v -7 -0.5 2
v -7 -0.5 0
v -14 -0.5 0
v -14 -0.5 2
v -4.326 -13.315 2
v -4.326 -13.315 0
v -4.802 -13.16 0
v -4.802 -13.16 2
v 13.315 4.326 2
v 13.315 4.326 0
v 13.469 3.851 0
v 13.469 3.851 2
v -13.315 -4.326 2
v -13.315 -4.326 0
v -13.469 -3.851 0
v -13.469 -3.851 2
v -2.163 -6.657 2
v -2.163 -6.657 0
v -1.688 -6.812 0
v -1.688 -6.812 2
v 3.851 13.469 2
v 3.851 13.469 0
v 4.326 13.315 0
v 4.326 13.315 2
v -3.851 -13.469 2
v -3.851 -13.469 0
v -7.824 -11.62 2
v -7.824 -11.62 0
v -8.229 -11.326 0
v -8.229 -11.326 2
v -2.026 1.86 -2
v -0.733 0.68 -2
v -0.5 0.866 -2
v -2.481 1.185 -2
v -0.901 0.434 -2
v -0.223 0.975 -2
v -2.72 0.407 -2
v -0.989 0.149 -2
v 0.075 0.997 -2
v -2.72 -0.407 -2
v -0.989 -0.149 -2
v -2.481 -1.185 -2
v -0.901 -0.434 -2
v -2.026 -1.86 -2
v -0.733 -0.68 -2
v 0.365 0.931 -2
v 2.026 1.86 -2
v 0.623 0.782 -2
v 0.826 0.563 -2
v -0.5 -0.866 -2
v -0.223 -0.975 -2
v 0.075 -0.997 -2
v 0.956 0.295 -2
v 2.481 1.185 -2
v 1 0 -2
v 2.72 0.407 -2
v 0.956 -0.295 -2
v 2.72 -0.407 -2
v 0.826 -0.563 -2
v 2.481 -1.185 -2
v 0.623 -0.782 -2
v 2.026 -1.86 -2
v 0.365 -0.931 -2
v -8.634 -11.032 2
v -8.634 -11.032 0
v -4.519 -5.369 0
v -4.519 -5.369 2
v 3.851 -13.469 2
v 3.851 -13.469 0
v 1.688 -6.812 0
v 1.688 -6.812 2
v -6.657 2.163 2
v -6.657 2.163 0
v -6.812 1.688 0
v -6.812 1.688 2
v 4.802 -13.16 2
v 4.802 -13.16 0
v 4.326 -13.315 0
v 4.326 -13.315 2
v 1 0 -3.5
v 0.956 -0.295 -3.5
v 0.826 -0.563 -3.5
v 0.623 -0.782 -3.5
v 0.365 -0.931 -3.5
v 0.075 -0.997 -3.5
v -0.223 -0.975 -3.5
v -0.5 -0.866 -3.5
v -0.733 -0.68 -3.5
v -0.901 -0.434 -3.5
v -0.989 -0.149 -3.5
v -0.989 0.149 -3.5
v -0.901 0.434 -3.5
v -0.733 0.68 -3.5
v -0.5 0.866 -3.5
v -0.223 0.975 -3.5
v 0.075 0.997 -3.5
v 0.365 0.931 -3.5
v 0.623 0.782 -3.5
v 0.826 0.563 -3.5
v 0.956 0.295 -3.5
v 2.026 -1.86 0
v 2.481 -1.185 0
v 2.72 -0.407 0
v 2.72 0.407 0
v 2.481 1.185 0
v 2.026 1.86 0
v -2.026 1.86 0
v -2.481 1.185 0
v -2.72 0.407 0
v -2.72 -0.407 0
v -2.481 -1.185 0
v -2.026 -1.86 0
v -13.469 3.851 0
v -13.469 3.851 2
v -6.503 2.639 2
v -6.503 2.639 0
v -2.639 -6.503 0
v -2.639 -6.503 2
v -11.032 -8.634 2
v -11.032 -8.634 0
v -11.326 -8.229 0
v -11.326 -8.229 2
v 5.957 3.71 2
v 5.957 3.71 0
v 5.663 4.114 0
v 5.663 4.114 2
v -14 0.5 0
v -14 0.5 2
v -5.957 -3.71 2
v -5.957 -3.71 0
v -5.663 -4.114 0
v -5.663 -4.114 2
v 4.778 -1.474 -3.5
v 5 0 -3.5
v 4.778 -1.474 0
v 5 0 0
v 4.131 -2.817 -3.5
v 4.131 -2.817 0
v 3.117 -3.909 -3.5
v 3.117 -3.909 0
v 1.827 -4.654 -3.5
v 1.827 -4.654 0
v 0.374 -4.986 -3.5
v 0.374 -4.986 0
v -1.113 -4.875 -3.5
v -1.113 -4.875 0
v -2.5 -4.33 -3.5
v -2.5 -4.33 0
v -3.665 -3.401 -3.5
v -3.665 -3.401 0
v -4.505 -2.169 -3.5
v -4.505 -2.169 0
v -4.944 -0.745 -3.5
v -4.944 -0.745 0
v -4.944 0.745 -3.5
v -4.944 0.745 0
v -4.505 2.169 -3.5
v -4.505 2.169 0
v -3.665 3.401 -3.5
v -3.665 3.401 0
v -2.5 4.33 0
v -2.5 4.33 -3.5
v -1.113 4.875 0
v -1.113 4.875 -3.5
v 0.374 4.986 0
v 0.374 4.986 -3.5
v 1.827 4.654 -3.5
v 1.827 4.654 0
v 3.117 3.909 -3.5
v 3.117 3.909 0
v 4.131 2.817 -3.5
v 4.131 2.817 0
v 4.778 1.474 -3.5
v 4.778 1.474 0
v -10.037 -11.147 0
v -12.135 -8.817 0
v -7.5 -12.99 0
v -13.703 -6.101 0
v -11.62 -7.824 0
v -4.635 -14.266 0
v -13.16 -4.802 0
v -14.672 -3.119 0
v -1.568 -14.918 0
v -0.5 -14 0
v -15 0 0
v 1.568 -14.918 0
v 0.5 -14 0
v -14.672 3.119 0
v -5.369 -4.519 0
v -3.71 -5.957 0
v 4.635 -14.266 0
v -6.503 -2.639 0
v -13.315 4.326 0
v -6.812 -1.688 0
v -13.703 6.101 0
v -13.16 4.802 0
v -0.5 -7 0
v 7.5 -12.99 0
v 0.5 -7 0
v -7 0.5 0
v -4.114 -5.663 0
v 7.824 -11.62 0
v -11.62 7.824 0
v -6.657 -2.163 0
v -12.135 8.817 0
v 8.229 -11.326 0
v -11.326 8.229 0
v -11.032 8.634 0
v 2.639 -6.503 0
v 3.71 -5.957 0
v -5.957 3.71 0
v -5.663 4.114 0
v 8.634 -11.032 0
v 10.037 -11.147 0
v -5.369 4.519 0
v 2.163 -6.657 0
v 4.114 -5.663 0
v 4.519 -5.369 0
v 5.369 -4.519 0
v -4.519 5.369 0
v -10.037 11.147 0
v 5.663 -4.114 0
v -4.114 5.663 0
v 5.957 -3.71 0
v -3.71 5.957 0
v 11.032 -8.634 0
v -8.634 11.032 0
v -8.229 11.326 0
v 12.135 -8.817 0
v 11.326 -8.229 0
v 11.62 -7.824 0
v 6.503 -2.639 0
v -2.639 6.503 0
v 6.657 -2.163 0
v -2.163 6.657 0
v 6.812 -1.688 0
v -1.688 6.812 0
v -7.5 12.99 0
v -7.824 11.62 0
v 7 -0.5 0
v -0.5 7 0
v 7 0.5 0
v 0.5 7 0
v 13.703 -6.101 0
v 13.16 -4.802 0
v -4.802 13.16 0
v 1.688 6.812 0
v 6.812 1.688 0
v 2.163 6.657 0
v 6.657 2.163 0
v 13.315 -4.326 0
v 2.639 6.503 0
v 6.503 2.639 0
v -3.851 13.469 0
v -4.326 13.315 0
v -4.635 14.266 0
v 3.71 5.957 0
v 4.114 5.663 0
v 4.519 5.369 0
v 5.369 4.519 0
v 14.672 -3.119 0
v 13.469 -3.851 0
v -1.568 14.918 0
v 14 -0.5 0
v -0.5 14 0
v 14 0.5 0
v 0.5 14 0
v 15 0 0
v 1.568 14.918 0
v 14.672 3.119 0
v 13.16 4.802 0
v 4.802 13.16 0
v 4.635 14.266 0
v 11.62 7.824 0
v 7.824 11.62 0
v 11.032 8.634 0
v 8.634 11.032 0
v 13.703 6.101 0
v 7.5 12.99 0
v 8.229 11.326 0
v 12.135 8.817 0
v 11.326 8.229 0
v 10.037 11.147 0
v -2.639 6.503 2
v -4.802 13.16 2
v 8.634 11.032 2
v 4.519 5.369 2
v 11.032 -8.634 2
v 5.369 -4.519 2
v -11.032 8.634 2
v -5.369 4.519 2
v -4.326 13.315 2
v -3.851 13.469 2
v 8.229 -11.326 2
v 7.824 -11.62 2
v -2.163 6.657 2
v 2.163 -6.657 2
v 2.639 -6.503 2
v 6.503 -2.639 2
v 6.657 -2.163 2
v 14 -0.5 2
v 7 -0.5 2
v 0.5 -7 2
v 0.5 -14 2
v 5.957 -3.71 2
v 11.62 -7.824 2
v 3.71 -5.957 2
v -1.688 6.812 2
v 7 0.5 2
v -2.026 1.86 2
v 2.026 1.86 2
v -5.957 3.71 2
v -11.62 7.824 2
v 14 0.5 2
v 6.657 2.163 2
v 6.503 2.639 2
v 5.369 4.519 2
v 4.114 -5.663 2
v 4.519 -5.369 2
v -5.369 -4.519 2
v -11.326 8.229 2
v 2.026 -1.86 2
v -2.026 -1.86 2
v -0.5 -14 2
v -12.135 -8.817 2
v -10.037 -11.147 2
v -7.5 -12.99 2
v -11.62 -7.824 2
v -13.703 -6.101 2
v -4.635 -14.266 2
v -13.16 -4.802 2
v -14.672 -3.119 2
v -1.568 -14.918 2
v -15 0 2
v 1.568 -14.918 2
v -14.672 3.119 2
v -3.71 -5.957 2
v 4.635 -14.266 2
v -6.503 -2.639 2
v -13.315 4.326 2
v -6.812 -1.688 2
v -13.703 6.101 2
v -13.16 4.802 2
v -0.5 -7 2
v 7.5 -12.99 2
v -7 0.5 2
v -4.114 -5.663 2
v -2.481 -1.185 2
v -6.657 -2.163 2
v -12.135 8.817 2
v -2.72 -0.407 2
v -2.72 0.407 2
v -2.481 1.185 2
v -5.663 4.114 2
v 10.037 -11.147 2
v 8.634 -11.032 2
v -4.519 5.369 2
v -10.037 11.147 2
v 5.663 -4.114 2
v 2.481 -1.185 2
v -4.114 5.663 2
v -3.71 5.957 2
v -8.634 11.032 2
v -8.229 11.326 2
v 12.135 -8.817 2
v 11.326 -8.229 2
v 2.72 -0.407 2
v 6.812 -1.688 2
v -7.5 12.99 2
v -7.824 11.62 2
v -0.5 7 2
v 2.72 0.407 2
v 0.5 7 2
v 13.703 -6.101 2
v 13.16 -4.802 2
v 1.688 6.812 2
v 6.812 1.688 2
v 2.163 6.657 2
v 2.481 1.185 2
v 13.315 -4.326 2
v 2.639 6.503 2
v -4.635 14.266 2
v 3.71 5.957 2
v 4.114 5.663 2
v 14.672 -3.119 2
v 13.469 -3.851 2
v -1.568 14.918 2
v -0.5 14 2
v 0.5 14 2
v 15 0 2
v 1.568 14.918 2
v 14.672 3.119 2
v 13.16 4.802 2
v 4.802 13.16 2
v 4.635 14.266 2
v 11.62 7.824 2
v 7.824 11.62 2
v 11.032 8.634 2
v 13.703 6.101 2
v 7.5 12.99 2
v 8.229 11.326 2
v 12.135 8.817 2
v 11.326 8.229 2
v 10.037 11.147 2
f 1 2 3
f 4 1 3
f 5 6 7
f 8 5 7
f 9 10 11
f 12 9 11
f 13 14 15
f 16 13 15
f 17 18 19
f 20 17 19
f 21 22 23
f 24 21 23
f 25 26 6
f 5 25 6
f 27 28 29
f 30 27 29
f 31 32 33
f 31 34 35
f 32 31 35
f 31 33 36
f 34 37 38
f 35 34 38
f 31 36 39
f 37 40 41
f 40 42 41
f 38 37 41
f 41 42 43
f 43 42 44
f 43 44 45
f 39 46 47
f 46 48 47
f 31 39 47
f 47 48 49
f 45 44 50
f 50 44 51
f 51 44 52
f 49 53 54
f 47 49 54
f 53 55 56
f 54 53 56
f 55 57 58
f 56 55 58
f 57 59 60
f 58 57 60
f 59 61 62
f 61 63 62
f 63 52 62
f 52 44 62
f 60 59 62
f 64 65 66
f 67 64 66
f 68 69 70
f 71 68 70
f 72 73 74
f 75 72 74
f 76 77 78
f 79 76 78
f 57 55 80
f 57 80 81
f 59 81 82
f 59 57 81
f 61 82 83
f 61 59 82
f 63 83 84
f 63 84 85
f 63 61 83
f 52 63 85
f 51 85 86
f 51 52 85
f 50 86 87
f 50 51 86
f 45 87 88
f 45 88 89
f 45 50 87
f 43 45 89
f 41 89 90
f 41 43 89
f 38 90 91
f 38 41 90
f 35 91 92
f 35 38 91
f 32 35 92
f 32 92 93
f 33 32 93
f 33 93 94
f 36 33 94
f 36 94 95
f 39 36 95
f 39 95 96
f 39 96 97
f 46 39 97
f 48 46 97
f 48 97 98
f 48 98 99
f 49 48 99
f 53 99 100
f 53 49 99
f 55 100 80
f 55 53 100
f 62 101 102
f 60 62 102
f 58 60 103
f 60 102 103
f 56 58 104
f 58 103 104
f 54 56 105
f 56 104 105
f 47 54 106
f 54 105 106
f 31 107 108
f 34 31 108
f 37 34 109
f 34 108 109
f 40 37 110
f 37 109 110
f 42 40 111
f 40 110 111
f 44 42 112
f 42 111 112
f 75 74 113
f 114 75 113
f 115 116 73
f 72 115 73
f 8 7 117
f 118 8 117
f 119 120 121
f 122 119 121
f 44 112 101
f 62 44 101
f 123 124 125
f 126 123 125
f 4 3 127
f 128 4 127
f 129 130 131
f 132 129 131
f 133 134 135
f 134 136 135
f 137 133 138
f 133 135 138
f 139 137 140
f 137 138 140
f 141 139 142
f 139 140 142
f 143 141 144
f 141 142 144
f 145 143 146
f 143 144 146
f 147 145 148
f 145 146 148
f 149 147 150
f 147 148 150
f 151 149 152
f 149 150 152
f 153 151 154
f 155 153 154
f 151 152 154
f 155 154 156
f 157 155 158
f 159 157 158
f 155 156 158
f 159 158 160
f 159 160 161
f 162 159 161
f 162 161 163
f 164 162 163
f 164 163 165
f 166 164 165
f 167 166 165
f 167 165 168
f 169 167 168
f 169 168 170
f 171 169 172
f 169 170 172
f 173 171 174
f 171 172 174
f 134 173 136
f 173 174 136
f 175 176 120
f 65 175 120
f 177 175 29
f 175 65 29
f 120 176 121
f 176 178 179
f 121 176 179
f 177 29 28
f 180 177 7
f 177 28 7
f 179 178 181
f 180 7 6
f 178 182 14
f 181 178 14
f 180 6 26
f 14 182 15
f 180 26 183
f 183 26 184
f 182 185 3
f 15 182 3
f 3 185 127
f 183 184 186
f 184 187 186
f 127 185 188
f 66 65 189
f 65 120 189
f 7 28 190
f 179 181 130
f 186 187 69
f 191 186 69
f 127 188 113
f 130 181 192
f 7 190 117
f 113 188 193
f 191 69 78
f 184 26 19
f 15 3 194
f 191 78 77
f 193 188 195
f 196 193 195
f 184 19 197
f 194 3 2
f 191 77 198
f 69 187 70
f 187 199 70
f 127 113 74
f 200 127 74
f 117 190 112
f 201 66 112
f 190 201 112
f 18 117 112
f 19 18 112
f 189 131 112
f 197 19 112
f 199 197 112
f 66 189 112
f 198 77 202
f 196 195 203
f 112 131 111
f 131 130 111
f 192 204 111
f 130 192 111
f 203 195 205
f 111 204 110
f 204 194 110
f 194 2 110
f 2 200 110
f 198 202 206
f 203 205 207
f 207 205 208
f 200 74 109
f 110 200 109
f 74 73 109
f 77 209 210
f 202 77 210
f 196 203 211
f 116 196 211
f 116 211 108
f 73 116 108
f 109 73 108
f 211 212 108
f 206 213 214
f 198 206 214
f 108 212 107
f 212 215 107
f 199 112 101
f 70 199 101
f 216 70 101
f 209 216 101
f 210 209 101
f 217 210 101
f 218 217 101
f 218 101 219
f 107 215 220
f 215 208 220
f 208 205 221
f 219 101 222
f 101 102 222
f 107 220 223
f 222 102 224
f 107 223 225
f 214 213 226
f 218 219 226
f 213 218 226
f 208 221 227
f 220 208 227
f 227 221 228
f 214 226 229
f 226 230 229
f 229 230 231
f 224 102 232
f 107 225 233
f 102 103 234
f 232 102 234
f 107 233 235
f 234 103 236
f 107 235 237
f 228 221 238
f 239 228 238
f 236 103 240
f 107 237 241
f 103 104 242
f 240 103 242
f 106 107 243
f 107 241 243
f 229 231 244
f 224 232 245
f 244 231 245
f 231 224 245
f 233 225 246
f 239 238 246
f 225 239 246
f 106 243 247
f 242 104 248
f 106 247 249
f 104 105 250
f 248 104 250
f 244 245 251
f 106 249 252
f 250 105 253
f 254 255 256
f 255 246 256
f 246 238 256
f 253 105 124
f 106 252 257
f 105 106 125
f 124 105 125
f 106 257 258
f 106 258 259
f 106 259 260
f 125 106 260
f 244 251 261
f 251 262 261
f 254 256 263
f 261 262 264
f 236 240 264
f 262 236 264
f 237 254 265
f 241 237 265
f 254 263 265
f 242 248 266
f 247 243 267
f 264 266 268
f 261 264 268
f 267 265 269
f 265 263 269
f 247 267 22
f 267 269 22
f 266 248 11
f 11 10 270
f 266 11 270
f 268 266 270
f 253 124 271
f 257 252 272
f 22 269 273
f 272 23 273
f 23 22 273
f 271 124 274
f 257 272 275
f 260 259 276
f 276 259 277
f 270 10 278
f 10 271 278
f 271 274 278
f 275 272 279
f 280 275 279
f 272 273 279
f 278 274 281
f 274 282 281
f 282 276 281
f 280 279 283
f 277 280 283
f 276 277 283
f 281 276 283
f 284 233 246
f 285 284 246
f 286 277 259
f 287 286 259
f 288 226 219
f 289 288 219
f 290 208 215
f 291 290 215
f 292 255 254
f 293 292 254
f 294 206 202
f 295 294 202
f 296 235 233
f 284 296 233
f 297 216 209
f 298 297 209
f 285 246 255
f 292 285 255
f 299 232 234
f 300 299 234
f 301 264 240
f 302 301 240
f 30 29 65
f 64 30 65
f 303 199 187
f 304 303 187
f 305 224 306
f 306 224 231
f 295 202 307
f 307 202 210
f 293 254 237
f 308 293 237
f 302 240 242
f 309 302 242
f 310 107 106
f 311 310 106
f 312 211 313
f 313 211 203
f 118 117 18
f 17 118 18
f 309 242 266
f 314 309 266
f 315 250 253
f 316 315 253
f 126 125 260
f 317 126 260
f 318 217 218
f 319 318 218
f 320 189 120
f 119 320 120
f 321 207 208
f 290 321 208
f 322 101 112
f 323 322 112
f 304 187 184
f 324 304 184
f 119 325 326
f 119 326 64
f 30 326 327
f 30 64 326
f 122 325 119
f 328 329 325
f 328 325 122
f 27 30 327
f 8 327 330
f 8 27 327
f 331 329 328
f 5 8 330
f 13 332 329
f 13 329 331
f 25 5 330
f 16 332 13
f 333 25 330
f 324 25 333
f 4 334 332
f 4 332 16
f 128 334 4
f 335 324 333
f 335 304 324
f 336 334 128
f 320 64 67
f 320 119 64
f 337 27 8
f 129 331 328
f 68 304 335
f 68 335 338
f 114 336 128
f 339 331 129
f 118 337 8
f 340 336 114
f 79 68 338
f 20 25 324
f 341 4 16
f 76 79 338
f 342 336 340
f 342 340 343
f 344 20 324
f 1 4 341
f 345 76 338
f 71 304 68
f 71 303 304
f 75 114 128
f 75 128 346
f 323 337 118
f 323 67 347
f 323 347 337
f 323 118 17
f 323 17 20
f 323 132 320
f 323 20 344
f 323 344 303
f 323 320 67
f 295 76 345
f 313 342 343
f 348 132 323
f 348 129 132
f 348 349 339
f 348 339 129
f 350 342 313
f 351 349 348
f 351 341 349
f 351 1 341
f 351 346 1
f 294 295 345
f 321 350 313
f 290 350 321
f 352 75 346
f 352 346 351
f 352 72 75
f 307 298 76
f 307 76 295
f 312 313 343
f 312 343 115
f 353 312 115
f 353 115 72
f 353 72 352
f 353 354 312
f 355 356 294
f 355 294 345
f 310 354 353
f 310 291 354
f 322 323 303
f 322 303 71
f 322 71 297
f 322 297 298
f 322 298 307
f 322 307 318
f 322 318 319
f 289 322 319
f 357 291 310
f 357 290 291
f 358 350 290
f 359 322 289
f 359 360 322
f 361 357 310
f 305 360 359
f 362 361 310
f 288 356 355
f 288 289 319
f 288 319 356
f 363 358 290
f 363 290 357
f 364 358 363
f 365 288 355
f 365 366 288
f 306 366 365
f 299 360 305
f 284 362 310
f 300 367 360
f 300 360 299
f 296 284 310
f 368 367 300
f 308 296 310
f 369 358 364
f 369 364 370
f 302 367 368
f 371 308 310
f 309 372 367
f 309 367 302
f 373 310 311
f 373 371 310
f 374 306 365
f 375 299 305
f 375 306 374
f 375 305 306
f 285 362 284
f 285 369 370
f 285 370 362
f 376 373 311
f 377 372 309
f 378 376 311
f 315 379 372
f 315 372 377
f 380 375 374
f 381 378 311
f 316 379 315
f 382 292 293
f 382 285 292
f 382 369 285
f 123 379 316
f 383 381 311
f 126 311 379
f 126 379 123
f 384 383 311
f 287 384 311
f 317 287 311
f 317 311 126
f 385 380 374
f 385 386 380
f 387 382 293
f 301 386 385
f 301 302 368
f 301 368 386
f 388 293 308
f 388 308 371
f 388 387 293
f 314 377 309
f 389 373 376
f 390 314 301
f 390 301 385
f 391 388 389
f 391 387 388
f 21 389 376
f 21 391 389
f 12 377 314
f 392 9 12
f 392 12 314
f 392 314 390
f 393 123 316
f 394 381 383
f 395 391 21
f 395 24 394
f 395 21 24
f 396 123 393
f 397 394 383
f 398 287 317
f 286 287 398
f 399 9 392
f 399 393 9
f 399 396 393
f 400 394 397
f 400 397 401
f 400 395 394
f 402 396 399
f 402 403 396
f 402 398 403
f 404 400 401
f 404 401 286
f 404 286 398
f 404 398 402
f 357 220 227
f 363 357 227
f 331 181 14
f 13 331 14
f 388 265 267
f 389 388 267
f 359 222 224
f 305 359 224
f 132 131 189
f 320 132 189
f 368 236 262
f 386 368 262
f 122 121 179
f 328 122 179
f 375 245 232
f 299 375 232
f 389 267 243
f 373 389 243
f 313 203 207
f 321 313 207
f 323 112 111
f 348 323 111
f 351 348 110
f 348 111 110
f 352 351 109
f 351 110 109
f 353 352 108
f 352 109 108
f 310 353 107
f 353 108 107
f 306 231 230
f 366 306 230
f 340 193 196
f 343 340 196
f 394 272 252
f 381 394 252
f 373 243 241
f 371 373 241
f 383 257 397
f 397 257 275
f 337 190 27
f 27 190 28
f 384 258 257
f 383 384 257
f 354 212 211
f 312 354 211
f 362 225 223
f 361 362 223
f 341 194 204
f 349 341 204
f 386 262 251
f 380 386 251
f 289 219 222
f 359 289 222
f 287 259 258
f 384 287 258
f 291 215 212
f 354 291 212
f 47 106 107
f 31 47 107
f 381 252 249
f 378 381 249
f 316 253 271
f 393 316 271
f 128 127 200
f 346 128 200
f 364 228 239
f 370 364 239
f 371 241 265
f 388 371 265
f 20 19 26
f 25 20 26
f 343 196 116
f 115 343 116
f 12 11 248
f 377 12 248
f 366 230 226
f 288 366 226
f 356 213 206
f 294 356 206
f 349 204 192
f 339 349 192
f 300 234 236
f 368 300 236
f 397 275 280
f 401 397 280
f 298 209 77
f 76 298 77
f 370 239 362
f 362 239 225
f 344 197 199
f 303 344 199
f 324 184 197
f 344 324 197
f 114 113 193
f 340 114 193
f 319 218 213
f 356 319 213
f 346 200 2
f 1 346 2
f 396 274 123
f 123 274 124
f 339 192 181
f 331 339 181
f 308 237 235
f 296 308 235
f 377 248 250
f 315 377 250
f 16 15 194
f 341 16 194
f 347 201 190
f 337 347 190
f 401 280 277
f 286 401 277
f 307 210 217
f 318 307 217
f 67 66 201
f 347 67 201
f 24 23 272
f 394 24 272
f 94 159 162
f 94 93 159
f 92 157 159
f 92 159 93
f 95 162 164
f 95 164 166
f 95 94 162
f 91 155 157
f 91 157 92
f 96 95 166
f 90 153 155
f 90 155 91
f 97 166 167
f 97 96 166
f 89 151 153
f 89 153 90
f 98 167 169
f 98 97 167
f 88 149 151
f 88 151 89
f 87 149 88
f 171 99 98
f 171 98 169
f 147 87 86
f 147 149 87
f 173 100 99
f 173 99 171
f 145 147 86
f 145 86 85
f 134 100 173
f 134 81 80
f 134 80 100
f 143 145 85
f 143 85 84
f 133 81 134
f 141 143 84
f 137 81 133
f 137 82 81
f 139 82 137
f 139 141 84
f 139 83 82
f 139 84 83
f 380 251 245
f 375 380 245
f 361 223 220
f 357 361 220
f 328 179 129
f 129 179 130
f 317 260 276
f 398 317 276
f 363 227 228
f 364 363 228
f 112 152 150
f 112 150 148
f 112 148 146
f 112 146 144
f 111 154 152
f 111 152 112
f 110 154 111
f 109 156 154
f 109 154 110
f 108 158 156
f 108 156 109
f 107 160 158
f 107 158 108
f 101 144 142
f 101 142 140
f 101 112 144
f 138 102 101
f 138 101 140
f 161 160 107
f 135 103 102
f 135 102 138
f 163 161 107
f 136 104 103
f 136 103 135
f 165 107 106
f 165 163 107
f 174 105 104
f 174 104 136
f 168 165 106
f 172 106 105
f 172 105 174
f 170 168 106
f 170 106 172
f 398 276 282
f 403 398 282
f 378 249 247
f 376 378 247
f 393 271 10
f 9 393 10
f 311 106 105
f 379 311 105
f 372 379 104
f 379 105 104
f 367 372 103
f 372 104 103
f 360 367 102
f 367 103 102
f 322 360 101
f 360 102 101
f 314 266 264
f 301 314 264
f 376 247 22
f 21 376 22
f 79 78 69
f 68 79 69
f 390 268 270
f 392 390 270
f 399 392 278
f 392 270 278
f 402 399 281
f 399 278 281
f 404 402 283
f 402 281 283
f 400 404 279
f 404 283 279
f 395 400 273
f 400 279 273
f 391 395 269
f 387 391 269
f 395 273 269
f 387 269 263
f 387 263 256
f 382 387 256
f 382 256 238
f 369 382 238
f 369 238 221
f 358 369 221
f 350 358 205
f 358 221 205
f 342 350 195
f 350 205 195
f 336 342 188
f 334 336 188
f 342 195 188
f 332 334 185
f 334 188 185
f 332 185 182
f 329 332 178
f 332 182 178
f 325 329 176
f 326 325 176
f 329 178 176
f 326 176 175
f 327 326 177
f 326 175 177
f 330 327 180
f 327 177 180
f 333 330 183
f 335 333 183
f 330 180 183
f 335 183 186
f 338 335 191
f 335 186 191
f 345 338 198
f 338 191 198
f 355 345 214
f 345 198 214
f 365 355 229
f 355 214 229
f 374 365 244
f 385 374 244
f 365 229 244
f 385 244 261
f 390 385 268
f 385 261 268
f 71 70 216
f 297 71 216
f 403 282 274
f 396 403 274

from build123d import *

# Parameters (mm, degrees)
F0_R     = 15
F1_DEPTH = 2
F2_R     = 5
F3_DEPTH = 2
F4_DEPTH = 2
F5_R     = 5
F5_R_2   = 1
F6_DEPTH = 1.5


with BuildPart() as f1:
    # F0 (on Top) → F1 (new body)
    with BuildSketch(Plane.XY):
        Circle(F0_R)
        Polygon((-8.633502, -11.032345), (-4.519005, -5.369226), (-4.114497, -5.663119), (-3.709988, -5.957012), (-7.824485, -11.620131), (-8.228994, -11.326238), align=None, mode=Mode.SUBTRACT)
        Polygon((-4.801766, -13.160283), (-2.638647, -6.502887), (-2.163119, -6.657396), (-1.687591, -6.811904), (-3.85071, -13.4693), (-4.326238, -13.314791), align=None, mode=Mode.SUBTRACT)
        Polygon((-11.620131, -7.824485), (-5.957012, -3.709988), (-5.663119, -4.114497), (-5.369226, -4.519005), (-11.032345, -8.633502), (-11.326238, -8.228994), align=None, mode=Mode.SUBTRACT)
        Polygon((-13.4693, -3.85071), (-6.811904, -1.687591), (-6.657396, -2.163119), (-6.502887, -2.638647), (-13.160283, -4.801766), (-13.314791, -4.326238), align=None, mode=Mode.SUBTRACT)
        Polygon((-0.5, -7), (0, -7), (0.5, -7), (0.5, -14), (0, -14), (-0.5, -14), align=None, mode=Mode.SUBTRACT)
        Polygon((3.85071, -13.4693), (1.687591, -6.811904), (2.163119, -6.657396), (2.638647, -6.502887), (4.801766, -13.160283), (4.326238, -13.314791), align=None, mode=Mode.SUBTRACT)
        Polygon((7.824485, -11.620131), (3.709988, -5.957012), (4.114497, -5.663119), (4.519005, -5.369226), (8.633502, -11.032345), (8.228994, -11.326238), align=None, mode=Mode.SUBTRACT)
        Polygon((11.032345, -8.633502), (5.369226, -4.519005), (5.663119, -4.114497), (5.957012, -3.709988), (11.620131, -7.824485), (11.326238, -8.228994), align=None, mode=Mode.SUBTRACT)
        Polygon((13.160283, -4.801766), (6.502887, -2.638647), (6.657396, -2.163119), (6.811904, -1.687591), (13.4693, -3.85071), (13.314791, -4.326238), align=None, mode=Mode.SUBTRACT)
        Polygon((-14, 0.5), (-7, 0.5), (-7, 0), (-7, -0.5), (-14, -0.5), (-14, 0), align=None, mode=Mode.SUBTRACT)
        Polygon((-13.160283, 4.801766), (-6.502887, 2.638647), (-6.657396, 2.163119), (-6.811904, 1.687591), (-13.4693, 3.85071), (-13.314791, 4.326238), align=None, mode=Mode.SUBTRACT)
        Polygon((-11.032345, 8.633502), (-5.369226, 4.519005), (-5.663119, 4.114497), (-5.957012, 3.709988), (-11.620131, 7.824485), (-11.326238, 8.228994), align=None, mode=Mode.SUBTRACT)
        Polygon((-7.824485, 11.620131), (-3.709988, 5.957012), (-4.114497, 5.663119), (-4.519005, 5.369226), (-8.633502, 11.032345), (-8.228994, 11.326238), align=None, mode=Mode.SUBTRACT)
        Polygon((-3.85071, 13.4693), (-1.687591, 6.811904), (-2.163119, 6.657396), (-2.638647, 6.502887), (-4.801766, 13.160283), (-4.326238, 13.314791), align=None, mode=Mode.SUBTRACT)
        with BuildLine():
            ThreePointArc((-2.025562, -1.86), (-2.75, 0), (-2.025562, 1.86))
            Line((-2.025562, 1.86), (2.025562, 1.86))
            ThreePointArc((2.025562, 1.86), (2.75, 0), (2.025562, -1.86))
            Line((2.025562, -1.86), (-2.025562, -1.86))
        make_face(mode=Mode.SUBTRACT)
        Polygon((14, -0.5), (7, -0.5), (7, 0), (7, 0.5), (14, 0.5), (14, 0), align=None, mode=Mode.SUBTRACT)
        Polygon((13.4693, 3.85071), (6.811904, 1.687591), (6.657396, 2.163119), (6.502887, 2.638647), (13.160283, 4.801766), (13.314791, 4.326238), align=None, mode=Mode.SUBTRACT)
        Polygon((11.620131, 7.824485), (5.957012, 3.709988), (5.663119, 4.114497), (5.369226, 4.519005), (11.032345, 8.633502), (11.326238, 8.228994), align=None, mode=Mode.SUBTRACT)
        Polygon((0.5, 14), (0.5, 7), (0, 7), (-0.5, 7), (-0.5, 14), (0, 14), align=None, mode=Mode.SUBTRACT)
        Polygon((4.801766, 13.160283), (2.638647, 6.502887), (2.163119, 6.657396), (1.687591, 6.811904), (3.85071, 13.4693), (4.326238, 13.314791), align=None, mode=Mode.SUBTRACT)
        Polygon((8.633502, 11.032345), (4.519005, 5.369226), (4.114497, 5.663119), (3.709988, 5.957012), (7.824485, 11.620131), (8.228994, 11.326238), align=None, mode=Mode.SUBTRACT)
    extrude(amount=F1_DEPTH)


with BuildPart() as f3:
    # F2 (on Top) → F3 (new body)
    with BuildSketch(Plane.XY):
        Circle(F2_R)
    extrude(amount=-F3_DEPTH)

    # F0 (on Top) → F4 (cut)
    with BuildSketch(Plane.XY):
        with BuildLine():
            Line((2.025562, 1.86), (-2.025562, 1.86))
            ThreePointArc((-2.025562, 1.86), (-2.75, 0), (-2.025562, -1.86))
            Line((-2.025562, -1.86), (2.025562, -1.86))
            ThreePointArc((2.025562, -1.86), (2.75, 0), (2.025562, 1.86))
        make_face()
    extrude(amount=-F4_DEPTH, mode=Mode.SUBTRACT)

    # F5 (on face) → F6 (join)
    with BuildSketch(Plane(origin=(0, 0, -2), x_dir=(1, 0, 0), z_dir=(0, 0, -1))):
        Circle(F5_R)
        Circle(F5_R_2, mode=Mode.SUBTRACT)
    extrude(amount=F6_DEPTH)


solid = Compound([f1.part, f3.part])
